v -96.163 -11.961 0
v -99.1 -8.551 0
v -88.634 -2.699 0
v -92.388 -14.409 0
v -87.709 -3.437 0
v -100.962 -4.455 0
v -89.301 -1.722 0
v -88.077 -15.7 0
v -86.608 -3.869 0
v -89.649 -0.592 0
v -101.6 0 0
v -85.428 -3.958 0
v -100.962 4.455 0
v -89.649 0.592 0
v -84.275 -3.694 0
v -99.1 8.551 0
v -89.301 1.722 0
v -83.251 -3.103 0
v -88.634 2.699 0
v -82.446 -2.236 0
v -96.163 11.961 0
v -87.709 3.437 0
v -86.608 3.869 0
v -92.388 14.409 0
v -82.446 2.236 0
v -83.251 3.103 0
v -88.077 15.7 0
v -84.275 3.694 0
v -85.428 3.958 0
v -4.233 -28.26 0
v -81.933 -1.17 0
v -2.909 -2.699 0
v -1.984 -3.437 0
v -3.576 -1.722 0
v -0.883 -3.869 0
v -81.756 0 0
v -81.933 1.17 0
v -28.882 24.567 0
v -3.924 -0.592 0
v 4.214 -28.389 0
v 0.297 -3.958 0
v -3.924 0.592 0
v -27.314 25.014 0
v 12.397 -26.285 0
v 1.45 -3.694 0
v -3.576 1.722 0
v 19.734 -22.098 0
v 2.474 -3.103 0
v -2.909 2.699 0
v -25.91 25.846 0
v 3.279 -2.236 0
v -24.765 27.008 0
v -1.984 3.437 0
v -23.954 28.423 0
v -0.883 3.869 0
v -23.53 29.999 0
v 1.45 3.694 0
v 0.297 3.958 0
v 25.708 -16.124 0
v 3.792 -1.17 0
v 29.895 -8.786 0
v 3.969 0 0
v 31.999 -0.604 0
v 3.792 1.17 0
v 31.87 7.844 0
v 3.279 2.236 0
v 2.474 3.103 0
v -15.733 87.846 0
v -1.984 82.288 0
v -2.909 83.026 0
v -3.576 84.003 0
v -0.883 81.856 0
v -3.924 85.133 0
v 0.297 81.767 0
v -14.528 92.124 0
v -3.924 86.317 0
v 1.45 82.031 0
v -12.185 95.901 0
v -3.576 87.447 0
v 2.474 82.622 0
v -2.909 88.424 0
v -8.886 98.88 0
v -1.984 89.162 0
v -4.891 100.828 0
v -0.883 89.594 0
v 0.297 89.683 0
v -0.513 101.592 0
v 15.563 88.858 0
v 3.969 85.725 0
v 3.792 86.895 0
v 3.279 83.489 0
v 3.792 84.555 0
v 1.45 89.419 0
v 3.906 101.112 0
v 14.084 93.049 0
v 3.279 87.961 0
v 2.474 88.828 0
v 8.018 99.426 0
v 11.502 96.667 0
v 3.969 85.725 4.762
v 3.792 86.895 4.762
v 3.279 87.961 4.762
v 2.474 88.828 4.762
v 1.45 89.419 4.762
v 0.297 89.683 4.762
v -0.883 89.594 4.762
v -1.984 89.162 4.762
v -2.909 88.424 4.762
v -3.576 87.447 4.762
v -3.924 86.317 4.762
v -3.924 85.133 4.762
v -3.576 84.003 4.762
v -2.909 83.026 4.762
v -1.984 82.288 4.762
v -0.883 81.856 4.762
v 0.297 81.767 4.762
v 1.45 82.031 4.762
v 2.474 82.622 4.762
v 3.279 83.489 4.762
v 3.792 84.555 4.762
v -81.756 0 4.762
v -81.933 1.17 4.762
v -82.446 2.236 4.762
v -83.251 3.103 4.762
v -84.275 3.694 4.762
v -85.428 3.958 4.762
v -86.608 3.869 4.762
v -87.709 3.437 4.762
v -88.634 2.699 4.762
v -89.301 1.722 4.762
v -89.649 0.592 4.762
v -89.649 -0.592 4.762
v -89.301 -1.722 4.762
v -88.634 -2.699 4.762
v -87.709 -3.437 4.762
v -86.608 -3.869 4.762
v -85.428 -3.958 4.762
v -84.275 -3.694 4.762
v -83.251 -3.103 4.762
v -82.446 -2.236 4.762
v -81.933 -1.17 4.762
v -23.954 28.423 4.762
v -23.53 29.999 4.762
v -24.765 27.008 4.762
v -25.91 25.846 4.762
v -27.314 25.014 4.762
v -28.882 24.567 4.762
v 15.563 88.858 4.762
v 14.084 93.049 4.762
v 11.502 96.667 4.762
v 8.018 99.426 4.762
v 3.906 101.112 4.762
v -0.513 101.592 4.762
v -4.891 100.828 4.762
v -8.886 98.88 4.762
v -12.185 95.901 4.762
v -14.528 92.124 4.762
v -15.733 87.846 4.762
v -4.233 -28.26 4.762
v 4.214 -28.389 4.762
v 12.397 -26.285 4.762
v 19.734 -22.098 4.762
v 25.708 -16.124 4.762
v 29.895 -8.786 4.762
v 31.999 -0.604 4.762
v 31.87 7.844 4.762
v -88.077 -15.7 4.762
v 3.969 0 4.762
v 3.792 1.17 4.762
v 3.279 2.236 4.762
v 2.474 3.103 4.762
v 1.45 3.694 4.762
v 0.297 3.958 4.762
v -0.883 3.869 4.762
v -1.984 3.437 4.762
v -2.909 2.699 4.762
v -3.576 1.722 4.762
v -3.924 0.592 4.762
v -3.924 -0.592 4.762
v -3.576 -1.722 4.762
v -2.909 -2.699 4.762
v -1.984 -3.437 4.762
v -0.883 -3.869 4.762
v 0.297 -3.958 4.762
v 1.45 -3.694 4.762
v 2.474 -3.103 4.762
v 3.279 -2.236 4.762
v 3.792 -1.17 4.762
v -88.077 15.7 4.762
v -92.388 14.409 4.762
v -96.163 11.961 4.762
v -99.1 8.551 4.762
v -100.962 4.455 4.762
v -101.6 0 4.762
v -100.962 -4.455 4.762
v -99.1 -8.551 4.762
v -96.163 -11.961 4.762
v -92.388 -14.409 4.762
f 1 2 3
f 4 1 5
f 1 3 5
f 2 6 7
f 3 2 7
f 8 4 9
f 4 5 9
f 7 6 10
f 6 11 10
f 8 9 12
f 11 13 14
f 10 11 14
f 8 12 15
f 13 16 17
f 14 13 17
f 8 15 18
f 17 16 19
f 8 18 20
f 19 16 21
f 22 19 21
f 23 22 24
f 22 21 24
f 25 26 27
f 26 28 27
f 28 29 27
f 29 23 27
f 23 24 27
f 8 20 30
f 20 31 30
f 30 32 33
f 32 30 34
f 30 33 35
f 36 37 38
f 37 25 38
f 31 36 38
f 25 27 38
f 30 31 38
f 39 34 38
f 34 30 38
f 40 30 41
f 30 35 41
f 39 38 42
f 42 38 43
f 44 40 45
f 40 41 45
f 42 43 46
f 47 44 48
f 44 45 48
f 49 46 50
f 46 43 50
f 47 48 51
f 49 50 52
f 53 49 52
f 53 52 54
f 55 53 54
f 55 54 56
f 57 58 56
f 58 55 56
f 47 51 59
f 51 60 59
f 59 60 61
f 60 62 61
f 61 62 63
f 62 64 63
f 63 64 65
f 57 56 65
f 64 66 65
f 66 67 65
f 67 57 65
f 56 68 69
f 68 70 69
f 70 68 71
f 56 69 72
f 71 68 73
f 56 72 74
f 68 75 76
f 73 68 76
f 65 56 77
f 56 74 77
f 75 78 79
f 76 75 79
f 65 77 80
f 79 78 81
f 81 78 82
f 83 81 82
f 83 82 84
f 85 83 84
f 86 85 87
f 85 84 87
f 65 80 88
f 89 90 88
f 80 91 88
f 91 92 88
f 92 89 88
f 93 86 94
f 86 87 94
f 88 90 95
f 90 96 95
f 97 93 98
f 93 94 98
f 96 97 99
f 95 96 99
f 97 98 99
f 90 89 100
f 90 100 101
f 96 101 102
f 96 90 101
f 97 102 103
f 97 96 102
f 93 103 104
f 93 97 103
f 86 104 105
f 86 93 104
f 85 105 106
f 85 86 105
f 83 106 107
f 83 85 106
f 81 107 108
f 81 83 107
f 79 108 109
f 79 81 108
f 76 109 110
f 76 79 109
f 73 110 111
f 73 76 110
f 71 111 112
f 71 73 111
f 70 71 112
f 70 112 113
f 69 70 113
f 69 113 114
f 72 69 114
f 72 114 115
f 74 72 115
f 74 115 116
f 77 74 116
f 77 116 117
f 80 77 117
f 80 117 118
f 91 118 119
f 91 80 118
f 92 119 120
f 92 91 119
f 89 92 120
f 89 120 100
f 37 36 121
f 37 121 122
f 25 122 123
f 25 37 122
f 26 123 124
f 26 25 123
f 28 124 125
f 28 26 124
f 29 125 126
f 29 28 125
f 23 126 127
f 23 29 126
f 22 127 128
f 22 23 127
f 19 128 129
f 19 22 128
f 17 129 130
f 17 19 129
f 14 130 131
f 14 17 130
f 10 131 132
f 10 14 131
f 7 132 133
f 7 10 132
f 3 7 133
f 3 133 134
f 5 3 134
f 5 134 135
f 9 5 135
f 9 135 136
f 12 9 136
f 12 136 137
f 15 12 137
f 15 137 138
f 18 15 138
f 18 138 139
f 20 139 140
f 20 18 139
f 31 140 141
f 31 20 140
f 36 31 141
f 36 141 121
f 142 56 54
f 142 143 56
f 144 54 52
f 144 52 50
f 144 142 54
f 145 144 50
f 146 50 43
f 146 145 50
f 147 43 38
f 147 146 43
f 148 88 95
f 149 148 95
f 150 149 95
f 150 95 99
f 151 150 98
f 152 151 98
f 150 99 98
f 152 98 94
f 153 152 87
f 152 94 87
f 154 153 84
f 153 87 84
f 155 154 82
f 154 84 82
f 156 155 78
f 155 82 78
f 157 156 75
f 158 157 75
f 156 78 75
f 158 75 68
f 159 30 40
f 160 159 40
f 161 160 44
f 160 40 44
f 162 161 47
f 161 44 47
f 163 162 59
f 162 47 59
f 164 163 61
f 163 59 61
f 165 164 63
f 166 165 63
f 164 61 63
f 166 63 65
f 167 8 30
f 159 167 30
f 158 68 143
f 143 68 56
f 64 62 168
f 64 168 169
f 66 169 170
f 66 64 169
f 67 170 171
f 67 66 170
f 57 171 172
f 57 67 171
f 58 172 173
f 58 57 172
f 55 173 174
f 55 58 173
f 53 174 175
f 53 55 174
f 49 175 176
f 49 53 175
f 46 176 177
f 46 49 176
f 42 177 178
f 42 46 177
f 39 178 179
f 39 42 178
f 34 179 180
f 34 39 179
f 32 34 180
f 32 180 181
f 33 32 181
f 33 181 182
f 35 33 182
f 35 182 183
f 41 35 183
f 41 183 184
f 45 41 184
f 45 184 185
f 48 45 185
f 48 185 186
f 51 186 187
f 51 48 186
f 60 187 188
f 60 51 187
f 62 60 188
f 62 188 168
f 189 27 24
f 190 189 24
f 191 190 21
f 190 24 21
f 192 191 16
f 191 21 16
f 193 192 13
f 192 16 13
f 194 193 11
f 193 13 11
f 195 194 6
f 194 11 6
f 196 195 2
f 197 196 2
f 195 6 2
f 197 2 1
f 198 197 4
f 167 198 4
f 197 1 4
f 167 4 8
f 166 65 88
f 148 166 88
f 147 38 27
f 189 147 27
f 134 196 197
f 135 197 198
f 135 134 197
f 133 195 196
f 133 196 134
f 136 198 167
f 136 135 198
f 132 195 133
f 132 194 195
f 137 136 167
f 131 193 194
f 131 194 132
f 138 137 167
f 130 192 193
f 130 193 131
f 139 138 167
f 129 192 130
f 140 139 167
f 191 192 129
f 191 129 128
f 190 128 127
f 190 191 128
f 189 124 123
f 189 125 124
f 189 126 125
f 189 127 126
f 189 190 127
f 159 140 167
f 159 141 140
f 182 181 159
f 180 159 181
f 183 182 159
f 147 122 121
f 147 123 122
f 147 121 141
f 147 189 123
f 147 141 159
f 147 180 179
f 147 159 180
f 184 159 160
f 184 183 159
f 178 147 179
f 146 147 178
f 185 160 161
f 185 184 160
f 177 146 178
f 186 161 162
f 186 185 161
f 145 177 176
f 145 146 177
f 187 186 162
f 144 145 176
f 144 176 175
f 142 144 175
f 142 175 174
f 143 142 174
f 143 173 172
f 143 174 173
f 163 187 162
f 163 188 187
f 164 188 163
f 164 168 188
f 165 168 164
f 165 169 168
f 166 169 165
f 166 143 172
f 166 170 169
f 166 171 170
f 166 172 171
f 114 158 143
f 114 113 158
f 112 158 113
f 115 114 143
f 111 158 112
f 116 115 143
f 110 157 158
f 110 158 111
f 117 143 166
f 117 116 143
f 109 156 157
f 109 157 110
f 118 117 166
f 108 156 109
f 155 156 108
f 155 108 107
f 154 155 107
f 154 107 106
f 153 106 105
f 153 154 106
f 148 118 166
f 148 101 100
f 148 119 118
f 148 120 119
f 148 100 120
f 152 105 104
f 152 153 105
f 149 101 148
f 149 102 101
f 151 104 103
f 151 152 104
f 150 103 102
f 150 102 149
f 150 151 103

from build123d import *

# Parameters (mm, degrees)
F0_R     = 3.96875
F1_DEPTH = 4.7625
F2_R     = 6.35


# Not quite as in the source:
# - a feature names something its author has since deleted; it is built from what else it names


with BuildPart() as f1:
    # F0 (on Top) → F1 (new body)
    with BuildSketch(Plane.XY):
        with BuildLine():
            Line((31.8700148185, 7.8436681485), (15.5628504577, 88.8576204098))
            ThreePointArc((15.5628504577, 88.8576204098), (-0.5130479886, 101.5917074959), (-15.732715337, 87.8456822313))
            Line((-15.732715337, 87.8456822313), (-24.1670854724, 25.2735804658))
            Line((-24.1670854724, 25.2735804658), (-88.0768518519, 15.6998222241))
            ThreePointArc((-88.0768518519, 15.6998222241), (-101.6, 0), (-88.0768518519, -15.6998222241))
            Line((-88.0768518519, -15.6998222241), (-4.2333333333, -28.2596800033))
            ThreePointArc((-4.2333333333, -28.2596800033), (22.921010673, -19.3106758579), (31.8700148185, 7.8436681485))
        make_face()
        with Locations((-85.725, 0)):
            Circle(F0_R, mode=Mode.SUBTRACT)
        Circle(F0_R, mode=Mode.SUBTRACT)
        with Locations((0, 85.725)):
            Circle(F0_R, mode=Mode.SUBTRACT)
    extrude(amount=F1_DEPTH)

    # F2
    f2_edges = [f1.edges().sort_by_distance(p)[0] for p in [
        (-24.167085, 25.27358, 2.38125),
    ]]
    fillet(f2_edges, radius=F2_R)


solid = f1.part
